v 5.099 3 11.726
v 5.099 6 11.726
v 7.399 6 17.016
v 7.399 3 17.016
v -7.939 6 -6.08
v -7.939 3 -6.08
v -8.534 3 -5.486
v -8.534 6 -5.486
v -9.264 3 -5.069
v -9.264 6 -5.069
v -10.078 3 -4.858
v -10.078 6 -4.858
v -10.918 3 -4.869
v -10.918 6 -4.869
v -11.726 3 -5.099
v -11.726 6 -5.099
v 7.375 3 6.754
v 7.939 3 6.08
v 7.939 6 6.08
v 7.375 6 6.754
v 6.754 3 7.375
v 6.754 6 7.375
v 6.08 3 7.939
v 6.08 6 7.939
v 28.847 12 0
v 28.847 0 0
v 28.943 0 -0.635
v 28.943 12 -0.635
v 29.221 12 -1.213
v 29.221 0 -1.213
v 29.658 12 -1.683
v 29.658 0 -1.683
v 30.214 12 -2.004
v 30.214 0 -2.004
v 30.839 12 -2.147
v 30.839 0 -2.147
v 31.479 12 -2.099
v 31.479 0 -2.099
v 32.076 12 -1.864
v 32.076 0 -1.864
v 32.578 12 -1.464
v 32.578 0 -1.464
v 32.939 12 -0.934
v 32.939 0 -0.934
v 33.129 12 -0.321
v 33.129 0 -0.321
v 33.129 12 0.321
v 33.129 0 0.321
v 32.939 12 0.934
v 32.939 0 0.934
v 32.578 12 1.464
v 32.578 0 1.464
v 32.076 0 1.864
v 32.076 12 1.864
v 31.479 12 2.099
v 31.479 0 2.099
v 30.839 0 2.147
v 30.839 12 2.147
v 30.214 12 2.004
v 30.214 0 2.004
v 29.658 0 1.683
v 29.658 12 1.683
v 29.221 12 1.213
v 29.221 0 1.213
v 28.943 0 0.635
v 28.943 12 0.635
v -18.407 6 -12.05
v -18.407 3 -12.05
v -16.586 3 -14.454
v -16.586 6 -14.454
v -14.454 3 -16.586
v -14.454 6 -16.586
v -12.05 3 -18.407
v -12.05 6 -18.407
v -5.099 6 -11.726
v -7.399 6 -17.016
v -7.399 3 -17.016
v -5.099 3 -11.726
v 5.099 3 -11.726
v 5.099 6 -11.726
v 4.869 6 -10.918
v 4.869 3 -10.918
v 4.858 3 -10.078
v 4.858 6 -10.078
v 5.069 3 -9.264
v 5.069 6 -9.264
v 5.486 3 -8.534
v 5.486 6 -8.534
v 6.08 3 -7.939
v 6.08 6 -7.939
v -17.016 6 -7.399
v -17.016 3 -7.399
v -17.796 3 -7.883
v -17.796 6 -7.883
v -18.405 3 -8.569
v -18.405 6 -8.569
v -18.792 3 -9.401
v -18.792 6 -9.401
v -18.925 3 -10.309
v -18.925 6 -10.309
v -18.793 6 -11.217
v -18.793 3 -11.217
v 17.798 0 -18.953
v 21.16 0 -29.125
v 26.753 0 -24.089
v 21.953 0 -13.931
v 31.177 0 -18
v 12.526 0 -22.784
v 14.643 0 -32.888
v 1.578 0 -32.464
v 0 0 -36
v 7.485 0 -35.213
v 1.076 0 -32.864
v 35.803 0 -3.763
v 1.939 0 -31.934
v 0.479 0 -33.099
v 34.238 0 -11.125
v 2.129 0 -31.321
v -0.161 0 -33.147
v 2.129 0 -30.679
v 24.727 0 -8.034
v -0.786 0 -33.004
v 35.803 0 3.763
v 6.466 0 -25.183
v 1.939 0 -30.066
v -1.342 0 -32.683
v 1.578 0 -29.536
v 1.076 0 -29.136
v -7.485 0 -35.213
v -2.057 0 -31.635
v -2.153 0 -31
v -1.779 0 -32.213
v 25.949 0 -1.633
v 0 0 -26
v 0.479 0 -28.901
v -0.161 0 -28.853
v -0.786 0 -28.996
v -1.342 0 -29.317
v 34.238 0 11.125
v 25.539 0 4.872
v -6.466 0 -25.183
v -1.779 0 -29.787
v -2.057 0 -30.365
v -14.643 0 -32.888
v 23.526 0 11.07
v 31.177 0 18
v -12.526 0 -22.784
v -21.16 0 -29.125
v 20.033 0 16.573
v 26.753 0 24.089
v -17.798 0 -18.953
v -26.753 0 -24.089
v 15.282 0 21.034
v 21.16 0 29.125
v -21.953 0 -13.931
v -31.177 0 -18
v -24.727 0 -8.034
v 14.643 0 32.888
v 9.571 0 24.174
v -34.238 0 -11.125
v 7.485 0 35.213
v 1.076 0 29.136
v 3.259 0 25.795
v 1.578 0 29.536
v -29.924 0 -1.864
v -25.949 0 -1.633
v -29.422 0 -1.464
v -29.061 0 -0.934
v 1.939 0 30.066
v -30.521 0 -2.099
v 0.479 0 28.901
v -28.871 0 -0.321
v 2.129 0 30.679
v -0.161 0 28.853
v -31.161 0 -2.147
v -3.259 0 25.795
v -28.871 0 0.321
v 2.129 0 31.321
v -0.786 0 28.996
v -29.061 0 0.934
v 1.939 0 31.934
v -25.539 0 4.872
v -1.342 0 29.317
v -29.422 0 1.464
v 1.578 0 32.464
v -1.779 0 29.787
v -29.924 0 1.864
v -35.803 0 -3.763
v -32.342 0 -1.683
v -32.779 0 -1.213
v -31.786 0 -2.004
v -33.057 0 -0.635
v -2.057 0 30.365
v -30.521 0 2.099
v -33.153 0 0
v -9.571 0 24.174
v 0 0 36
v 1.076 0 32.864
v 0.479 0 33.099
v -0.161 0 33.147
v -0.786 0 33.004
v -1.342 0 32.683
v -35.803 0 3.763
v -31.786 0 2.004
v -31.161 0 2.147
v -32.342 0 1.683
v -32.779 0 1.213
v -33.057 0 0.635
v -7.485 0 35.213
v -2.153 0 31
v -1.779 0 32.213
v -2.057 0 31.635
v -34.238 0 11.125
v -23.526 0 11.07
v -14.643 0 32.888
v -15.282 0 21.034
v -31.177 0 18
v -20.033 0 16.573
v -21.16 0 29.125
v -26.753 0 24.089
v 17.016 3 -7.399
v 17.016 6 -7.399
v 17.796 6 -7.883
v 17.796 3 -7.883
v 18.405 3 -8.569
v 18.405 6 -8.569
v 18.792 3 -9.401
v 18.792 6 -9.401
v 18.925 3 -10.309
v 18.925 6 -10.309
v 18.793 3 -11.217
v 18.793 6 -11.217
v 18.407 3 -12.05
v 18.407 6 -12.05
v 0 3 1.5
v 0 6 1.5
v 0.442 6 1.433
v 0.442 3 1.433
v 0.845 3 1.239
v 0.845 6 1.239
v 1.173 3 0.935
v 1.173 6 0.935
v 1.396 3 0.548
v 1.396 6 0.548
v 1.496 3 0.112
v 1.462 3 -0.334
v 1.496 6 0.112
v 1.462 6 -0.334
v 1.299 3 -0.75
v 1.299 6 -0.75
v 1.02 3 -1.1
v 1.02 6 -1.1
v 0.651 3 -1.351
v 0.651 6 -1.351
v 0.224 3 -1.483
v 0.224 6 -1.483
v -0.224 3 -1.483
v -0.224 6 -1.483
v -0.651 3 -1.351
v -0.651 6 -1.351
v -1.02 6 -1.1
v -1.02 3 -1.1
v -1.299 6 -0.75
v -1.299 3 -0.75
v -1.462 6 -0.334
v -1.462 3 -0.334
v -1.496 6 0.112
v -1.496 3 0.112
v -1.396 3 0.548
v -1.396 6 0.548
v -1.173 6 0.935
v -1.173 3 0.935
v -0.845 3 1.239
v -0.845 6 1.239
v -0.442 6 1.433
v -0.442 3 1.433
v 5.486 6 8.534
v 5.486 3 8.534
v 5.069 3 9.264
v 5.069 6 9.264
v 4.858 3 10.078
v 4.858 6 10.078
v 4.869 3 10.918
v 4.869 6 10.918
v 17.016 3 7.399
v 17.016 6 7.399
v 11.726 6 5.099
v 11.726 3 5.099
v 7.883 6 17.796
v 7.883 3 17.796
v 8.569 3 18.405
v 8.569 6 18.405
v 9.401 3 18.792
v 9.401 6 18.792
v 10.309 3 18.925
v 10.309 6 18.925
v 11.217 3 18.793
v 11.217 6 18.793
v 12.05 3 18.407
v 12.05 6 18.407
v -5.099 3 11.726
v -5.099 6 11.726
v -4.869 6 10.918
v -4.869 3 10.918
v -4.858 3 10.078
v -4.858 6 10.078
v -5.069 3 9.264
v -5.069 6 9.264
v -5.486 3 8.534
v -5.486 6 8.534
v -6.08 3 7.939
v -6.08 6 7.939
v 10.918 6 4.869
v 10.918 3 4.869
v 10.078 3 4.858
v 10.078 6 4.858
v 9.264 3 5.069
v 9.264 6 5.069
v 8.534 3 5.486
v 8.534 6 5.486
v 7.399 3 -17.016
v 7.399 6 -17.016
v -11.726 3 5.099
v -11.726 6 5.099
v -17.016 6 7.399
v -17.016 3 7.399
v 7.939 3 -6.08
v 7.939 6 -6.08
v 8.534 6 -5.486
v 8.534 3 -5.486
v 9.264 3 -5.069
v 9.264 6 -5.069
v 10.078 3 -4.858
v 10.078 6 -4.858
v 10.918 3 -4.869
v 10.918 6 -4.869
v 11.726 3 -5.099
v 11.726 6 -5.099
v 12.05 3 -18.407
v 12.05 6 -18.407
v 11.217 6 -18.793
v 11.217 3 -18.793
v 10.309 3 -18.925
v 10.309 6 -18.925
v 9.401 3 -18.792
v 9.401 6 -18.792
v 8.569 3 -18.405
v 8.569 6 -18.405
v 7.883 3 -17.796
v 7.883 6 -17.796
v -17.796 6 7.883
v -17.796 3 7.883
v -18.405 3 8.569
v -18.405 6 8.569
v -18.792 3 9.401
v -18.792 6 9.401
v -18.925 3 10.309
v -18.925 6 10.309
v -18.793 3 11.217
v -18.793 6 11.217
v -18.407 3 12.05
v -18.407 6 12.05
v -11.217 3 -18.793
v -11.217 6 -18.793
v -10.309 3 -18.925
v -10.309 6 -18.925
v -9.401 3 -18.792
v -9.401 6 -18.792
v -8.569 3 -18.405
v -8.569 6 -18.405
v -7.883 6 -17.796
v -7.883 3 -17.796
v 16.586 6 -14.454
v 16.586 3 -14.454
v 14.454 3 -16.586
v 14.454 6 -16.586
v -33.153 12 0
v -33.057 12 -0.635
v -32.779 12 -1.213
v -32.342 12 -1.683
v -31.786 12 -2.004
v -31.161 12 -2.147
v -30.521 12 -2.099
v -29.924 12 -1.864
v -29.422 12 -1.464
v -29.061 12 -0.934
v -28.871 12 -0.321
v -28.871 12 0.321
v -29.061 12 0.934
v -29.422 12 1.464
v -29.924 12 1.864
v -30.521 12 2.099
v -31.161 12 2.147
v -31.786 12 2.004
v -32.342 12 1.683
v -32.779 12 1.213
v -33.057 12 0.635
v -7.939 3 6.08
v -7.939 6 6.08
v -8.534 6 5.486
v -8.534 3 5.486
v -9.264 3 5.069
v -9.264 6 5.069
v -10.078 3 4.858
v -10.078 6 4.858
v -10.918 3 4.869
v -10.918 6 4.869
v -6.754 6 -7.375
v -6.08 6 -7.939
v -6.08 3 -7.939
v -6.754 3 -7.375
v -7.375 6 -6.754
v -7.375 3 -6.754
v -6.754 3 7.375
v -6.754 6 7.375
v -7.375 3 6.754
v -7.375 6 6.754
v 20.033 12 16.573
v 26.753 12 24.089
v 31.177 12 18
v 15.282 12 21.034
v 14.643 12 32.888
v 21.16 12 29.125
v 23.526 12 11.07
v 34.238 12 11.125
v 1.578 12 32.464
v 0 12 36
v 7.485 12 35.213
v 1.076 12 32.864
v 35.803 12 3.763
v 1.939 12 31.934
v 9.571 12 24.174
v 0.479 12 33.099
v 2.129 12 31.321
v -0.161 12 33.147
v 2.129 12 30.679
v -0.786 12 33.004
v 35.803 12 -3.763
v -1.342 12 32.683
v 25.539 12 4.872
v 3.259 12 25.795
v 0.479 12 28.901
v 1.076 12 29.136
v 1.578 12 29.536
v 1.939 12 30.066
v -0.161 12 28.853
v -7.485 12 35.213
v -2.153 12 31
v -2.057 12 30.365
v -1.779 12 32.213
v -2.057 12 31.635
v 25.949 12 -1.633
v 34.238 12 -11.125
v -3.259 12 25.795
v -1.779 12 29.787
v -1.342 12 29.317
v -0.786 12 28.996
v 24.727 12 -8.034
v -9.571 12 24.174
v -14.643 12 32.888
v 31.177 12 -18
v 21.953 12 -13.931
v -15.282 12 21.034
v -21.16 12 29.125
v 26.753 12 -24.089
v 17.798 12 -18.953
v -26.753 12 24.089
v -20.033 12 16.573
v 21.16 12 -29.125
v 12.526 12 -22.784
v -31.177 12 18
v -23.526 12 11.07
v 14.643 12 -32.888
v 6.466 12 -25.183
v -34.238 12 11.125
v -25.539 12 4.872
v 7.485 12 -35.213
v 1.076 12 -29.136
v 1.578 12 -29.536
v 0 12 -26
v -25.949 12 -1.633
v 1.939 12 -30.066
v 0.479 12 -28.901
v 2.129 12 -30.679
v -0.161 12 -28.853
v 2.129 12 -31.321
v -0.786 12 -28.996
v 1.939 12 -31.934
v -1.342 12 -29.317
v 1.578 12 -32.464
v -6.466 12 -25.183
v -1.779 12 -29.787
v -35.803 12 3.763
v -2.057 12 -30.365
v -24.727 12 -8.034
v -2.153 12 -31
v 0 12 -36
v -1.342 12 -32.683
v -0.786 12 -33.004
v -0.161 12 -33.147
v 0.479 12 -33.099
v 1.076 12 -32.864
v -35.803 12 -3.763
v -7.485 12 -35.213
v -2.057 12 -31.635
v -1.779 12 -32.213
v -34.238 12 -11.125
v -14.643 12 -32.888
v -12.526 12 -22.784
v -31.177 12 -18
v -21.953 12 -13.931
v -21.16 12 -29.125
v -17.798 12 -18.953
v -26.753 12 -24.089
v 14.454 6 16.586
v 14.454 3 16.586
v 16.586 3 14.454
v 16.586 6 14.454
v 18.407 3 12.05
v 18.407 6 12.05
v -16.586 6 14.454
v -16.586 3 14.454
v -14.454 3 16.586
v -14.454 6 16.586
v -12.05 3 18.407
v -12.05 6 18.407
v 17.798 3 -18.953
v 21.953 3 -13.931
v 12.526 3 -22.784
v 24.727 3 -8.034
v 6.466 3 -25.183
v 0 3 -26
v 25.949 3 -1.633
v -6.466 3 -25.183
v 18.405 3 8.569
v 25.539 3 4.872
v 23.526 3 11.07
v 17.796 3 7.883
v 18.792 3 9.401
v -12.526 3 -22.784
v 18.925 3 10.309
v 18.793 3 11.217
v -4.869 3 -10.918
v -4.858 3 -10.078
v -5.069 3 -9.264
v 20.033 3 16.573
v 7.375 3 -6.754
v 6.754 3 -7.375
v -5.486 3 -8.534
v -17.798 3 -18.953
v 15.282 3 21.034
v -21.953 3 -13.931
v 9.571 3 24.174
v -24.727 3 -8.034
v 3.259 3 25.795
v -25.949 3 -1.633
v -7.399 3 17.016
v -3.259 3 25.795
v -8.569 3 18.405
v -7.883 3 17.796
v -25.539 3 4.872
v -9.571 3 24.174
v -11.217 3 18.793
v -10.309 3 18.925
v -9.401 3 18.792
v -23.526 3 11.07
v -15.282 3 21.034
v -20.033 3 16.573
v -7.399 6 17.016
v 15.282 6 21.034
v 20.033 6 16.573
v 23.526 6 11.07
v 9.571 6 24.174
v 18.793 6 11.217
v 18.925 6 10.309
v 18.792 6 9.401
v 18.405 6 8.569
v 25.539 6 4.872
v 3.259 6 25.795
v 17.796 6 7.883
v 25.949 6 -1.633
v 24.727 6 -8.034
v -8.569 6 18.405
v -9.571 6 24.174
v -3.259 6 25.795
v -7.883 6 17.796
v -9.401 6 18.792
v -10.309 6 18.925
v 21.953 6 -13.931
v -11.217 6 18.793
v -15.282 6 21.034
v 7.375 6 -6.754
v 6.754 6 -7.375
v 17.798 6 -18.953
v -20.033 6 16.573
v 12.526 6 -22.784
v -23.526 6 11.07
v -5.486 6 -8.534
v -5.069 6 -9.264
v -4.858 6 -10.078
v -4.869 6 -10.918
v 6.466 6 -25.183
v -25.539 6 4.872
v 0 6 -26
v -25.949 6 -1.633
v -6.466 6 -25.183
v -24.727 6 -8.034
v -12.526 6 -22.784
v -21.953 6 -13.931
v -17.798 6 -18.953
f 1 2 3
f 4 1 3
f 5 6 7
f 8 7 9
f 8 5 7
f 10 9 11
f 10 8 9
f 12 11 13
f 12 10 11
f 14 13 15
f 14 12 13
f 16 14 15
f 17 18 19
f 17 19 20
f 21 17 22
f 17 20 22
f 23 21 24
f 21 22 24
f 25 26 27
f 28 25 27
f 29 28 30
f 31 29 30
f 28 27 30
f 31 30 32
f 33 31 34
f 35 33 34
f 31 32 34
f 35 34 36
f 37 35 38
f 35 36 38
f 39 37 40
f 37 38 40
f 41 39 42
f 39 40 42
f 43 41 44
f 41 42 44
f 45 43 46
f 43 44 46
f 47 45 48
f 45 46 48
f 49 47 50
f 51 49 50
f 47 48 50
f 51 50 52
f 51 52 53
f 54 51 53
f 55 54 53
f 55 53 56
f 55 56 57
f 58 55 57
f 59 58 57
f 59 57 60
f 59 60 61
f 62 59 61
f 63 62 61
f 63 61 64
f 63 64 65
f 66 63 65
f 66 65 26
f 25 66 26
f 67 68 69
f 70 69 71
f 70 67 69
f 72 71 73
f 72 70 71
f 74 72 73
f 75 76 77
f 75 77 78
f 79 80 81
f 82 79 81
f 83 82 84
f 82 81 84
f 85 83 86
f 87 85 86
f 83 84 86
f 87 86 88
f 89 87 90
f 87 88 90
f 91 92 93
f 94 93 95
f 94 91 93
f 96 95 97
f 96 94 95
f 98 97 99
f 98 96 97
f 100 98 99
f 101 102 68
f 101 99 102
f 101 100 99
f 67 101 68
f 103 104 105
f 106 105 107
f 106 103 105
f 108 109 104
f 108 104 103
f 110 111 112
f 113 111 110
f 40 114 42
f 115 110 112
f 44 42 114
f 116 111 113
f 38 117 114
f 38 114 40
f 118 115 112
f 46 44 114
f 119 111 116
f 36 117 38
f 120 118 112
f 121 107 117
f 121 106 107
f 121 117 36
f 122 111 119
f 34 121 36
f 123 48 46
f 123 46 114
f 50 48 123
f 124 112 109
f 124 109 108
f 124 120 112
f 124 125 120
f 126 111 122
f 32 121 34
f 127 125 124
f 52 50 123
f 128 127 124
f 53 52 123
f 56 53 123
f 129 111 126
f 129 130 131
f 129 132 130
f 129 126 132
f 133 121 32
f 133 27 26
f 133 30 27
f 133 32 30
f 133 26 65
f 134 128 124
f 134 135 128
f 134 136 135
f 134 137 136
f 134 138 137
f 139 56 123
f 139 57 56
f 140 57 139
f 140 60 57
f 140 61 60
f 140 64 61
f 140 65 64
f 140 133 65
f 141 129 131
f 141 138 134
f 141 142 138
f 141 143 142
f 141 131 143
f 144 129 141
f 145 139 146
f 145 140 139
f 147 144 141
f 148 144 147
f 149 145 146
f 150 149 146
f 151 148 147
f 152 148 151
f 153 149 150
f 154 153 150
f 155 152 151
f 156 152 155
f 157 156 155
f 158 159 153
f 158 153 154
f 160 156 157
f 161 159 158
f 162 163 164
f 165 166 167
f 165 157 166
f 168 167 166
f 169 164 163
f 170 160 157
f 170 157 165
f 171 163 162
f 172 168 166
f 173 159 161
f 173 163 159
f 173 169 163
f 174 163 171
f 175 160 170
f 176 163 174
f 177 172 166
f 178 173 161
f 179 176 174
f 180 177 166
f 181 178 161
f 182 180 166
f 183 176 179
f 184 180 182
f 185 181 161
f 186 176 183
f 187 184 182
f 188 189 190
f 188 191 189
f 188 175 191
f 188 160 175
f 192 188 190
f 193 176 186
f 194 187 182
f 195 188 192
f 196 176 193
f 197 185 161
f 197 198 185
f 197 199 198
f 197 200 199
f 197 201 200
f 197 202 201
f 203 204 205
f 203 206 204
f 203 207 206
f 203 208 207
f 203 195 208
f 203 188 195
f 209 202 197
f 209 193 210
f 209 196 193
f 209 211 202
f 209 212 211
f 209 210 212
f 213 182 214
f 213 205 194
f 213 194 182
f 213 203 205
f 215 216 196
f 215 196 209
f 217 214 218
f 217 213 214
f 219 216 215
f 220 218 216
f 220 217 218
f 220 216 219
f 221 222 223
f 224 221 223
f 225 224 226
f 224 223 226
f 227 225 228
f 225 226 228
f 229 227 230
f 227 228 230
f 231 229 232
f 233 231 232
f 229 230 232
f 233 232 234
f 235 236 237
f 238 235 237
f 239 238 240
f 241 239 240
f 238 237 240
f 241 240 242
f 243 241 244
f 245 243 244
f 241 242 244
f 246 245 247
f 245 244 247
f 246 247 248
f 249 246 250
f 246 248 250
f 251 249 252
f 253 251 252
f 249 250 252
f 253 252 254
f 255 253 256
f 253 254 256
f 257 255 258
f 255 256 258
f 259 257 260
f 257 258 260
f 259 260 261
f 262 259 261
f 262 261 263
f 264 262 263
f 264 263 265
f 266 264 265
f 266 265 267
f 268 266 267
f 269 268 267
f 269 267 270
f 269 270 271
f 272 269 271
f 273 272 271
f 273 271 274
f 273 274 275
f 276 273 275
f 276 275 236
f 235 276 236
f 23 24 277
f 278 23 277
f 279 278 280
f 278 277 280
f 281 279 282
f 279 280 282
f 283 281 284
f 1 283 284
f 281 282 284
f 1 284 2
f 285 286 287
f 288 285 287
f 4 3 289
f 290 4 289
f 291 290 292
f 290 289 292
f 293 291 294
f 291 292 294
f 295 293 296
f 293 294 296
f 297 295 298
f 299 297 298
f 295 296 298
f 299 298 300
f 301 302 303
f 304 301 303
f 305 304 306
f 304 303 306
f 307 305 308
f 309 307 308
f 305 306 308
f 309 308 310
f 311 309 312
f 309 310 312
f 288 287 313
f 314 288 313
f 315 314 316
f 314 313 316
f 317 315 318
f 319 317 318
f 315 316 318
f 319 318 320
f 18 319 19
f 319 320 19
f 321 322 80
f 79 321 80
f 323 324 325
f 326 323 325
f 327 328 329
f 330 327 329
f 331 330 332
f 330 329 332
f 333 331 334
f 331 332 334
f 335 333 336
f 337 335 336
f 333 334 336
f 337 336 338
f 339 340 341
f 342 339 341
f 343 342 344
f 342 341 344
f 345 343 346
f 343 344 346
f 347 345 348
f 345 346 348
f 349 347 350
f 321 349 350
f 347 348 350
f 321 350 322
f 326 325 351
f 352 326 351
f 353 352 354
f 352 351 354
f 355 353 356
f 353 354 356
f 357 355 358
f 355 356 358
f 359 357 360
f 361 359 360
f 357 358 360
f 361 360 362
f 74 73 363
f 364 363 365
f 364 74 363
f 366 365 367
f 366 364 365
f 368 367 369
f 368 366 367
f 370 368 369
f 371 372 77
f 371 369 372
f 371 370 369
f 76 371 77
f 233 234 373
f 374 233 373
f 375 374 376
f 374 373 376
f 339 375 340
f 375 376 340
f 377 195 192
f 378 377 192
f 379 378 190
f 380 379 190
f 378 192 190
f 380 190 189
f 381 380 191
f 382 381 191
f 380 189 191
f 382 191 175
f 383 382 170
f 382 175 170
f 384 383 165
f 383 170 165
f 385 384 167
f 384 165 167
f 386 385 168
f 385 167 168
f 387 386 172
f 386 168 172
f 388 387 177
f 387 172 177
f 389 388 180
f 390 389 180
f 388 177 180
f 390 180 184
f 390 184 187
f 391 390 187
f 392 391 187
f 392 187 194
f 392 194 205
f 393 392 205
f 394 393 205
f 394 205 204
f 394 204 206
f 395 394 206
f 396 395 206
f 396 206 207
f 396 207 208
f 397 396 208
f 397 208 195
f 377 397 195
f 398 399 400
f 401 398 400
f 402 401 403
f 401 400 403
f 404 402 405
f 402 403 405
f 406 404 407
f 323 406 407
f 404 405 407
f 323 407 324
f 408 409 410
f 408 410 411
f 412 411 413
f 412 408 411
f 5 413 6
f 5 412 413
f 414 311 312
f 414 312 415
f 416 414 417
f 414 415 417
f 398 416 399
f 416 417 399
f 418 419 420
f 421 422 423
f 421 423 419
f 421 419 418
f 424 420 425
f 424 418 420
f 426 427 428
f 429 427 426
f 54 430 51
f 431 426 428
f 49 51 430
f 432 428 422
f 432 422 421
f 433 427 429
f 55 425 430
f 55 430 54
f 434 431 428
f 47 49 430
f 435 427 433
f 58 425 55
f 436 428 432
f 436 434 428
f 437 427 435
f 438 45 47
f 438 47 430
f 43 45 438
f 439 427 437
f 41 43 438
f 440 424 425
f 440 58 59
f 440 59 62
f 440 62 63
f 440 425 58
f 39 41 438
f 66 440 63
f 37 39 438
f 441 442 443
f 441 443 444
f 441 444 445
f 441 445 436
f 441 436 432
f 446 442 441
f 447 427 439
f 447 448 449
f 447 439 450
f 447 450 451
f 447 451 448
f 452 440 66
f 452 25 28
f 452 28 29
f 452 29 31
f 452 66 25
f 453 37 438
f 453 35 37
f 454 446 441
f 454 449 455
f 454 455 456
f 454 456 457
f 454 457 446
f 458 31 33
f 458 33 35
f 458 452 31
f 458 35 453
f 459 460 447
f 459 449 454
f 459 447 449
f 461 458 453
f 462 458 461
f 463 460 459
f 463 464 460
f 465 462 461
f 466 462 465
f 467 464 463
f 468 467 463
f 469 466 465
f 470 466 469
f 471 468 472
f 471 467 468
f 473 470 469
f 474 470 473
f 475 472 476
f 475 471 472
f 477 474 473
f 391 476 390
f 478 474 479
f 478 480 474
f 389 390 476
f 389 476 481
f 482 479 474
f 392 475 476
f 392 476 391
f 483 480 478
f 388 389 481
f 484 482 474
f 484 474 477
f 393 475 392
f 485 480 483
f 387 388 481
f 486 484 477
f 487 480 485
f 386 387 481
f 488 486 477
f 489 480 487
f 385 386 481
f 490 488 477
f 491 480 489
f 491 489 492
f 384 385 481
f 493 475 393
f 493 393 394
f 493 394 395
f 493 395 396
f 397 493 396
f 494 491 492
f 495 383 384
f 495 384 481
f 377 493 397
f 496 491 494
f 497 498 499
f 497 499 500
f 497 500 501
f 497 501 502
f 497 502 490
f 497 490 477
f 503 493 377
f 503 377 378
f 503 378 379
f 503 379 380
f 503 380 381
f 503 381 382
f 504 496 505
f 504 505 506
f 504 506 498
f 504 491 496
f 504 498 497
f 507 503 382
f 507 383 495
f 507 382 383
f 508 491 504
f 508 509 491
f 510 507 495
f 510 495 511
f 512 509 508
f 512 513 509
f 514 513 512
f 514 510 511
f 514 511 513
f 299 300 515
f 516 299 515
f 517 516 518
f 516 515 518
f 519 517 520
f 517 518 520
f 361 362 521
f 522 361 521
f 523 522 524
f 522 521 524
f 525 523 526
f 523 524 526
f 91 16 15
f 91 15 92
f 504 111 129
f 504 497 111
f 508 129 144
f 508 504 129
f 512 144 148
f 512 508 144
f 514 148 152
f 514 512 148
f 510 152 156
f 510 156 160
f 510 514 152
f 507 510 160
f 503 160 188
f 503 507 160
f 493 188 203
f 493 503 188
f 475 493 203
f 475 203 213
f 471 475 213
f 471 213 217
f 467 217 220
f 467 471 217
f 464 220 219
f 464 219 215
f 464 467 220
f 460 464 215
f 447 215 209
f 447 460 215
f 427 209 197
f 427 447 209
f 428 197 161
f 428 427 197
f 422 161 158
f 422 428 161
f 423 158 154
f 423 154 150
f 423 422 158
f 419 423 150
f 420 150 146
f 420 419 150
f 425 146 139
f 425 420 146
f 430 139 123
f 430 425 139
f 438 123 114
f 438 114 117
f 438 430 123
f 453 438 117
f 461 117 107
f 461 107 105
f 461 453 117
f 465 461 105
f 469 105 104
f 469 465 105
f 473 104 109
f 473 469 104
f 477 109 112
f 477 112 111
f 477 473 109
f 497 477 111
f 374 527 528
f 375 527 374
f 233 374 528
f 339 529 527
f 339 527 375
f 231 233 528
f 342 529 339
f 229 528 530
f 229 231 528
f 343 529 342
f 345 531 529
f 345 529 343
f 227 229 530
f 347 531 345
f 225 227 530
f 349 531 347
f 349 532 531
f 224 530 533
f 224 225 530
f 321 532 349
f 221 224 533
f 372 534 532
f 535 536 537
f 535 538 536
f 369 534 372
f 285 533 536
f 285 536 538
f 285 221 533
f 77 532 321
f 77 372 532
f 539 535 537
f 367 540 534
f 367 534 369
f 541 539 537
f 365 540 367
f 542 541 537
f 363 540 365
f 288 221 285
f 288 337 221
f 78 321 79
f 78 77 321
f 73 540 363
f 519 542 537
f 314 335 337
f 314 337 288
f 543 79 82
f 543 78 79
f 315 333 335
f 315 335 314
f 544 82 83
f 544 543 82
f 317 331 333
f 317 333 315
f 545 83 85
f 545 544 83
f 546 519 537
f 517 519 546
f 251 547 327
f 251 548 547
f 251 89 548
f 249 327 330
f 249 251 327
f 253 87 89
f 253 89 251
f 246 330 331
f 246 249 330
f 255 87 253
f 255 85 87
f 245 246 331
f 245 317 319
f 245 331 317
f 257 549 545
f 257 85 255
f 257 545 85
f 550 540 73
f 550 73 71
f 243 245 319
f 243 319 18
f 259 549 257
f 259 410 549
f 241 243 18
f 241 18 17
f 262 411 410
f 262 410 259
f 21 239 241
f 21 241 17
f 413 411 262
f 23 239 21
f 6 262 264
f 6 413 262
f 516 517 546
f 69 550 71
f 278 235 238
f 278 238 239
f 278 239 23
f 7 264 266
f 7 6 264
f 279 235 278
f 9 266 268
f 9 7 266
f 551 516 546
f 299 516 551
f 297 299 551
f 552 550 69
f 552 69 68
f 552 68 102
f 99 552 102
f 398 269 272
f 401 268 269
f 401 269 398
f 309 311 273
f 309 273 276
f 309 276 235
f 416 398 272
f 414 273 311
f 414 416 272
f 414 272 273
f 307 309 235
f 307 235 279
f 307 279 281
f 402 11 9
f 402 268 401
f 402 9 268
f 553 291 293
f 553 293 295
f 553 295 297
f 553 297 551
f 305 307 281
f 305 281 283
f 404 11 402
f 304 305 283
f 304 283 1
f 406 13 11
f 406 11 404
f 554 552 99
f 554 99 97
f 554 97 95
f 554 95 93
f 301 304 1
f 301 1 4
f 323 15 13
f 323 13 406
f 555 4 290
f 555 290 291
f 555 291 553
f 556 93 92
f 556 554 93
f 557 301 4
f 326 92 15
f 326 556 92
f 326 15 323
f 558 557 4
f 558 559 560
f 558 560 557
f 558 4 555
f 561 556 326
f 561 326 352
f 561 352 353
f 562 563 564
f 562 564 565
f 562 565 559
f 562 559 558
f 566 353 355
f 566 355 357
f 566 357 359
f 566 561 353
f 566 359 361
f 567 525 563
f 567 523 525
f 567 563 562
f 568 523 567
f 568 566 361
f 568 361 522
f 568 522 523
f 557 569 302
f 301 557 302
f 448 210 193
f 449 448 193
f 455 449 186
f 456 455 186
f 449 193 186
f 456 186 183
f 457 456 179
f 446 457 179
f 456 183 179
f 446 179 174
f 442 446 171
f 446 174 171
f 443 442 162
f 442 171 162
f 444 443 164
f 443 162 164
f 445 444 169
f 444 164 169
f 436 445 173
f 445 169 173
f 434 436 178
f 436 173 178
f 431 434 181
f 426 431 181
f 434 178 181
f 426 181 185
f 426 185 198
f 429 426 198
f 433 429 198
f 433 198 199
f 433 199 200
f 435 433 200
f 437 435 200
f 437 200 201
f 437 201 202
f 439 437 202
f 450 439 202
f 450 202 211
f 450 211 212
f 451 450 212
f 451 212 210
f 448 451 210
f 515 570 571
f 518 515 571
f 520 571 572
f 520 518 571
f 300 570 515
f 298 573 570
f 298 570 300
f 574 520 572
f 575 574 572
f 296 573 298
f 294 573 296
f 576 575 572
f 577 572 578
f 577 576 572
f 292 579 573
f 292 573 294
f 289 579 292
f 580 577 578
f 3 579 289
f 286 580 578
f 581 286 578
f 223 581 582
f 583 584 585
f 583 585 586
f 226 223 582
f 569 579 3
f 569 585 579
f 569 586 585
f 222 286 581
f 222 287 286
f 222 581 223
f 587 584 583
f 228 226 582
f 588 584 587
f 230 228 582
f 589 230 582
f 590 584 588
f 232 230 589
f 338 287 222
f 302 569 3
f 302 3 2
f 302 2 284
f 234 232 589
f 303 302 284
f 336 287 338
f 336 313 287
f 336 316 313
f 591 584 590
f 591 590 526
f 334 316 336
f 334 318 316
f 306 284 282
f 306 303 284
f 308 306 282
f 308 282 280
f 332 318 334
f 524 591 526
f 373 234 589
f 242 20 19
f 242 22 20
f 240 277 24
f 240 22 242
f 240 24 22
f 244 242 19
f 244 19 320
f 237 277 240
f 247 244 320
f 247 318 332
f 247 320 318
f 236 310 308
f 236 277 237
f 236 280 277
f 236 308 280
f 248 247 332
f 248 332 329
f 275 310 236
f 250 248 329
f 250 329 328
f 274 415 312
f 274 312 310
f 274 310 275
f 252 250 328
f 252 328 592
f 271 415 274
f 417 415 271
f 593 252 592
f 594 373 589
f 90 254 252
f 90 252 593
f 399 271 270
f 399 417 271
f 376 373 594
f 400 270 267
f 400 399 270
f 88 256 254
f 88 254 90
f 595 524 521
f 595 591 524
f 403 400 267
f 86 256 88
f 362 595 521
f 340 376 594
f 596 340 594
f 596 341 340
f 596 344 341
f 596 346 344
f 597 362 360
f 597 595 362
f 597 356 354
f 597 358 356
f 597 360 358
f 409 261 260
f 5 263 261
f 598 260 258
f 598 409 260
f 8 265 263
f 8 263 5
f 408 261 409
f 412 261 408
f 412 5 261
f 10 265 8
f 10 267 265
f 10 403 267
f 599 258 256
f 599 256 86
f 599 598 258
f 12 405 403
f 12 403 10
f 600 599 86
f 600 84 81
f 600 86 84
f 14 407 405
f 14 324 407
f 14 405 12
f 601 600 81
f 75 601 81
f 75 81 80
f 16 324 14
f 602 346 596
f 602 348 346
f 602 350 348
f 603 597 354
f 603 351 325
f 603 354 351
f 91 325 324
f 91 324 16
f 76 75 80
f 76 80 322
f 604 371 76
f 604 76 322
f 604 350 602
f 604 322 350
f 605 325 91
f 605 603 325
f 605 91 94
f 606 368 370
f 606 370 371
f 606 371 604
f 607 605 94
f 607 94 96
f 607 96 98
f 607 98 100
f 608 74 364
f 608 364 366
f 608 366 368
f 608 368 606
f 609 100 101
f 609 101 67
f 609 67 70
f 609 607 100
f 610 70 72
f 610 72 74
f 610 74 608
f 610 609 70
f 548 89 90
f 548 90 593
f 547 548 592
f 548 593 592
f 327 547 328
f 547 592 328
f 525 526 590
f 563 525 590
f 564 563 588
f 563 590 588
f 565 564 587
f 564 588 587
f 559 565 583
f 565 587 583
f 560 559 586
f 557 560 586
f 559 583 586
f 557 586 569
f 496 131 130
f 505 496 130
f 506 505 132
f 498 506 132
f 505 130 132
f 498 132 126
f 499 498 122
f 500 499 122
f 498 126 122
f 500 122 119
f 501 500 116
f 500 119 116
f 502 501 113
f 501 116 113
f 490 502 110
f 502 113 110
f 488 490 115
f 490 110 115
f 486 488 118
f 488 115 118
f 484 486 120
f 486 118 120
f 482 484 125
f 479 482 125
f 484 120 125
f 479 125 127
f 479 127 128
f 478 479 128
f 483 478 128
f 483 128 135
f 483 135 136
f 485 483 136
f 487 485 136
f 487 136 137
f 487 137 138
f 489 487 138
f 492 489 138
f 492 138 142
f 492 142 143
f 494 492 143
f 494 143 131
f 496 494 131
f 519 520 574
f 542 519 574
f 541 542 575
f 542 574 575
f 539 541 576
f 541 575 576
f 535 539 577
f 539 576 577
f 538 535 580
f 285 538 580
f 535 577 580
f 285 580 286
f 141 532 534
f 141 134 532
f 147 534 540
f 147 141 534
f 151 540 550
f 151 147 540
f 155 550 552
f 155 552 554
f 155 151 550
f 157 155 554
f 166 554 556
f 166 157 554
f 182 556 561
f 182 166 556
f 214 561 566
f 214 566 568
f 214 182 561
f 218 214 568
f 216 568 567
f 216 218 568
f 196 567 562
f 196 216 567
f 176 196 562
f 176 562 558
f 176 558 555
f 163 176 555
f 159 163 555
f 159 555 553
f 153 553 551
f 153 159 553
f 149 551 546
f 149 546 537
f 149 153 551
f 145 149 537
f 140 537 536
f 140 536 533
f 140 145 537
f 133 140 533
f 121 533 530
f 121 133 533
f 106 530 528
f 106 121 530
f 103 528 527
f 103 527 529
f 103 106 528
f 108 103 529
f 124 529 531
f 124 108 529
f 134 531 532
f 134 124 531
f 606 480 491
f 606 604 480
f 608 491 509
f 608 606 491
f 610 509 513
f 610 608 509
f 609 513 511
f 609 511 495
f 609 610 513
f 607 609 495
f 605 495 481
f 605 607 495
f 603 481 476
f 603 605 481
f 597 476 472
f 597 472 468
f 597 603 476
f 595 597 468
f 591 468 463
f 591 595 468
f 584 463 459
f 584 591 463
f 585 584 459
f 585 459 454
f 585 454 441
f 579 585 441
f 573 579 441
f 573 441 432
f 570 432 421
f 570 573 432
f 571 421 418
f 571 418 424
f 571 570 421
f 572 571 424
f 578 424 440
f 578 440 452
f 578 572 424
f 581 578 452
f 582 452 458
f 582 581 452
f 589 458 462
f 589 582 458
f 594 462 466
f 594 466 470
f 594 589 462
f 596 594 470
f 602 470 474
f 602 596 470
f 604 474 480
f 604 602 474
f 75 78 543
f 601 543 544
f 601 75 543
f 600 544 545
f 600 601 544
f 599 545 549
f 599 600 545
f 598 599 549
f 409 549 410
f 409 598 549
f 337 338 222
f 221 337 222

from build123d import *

# Parameters (mm, degrees)
CUT_EXTRUDE1_REACH               = 53.264
F_18_0_1695_DIAMETER_HOLE1_D     = 4.3053
F_18_0_1695_DIAMETER_HOLE1_DEPTH = 381
F_18_0_1695_DIAMETER_HOLE1_TIP   = 1.293442612
CUT_EXTRUDE2_REACH               = 53.264
SKETCH5_R                        = 1.5


with BuildPart() as part:
    # Sketch1 → Revolve1 (revolve)
    with BuildSketch(Plane.XY):
        Polygon((0, 3), (26, 3), (26, 0), (36, 0), (36, 12), (26, 12), (26, 6), (0, 6), align=None)
    revolve(axis=Axis((0, 0, 0), (0, 1, 0)))

    # Sketch2 → Cut-Extrude1 (cut, up to next)
    with BuildSketch(Plane(origin=(0, 6, 0), x_dir=(1, 0, 0), z_dir=(0, 1, 0)), mode=Mode.PRIVATE) as cut_extrude1_sk1:
        with BuildLine():
            Line((7.398917645, 17.016345603), (5.098689446, 11.726182923))
            ThreePointArc((5.098689446, 11.726182923), (4.936869827, 9.663717077), (6.079965983, 7.939396303))
            ThreePointArc((6.079965983, 7.939396303), (7.071067812, 7.071067812), (7.939396303, 6.079965983))
            ThreePointArc((7.939396303, 6.079965983), (9.663717077, 4.936869827), (11.726182923, 5.098689446))
            Line((11.726182923, 5.098689446), (17.016345603, 7.398917645))
            ThreePointArc((17.016345603, 7.398917645), (18.792276888, 9.401129193), (18.406745328, 12.049552955))
            ThreePointArc((18.406745328, 12.049552955), (15.556349186, 15.556349186), (12.049552955, 18.406745328))
            ThreePointArc((12.049552955, 18.406745328), (9.401129193, 18.792276888), (7.398917645, 17.016345603))
        make_face()
    cut_extrude1_tool1 = extrude(cut_extrude1_sk1.sketch, amount=-CUT_EXTRUDE1_REACH, mode=Mode.PRIVATE) & part.part
    # Sketch2 → Cut-Extrude1 (cut, up to next)
    with BuildSketch(Plane(origin=(0, 6, 0), x_dir=(1, 0, 0), z_dir=(0, 1, 0)), mode=Mode.PRIVATE) as cut_extrude1_sk2:
        with BuildLine():
            Line((-7.398917645, 17.016345603), (-5.098689446, 11.726182923))
            ThreePointArc((-5.098689446, 11.726182923), (-4.936869827, 9.663717077), (-6.079965983, 7.939396303))
            ThreePointArc((-6.079965983, 7.939396303), (-7.071067812, 7.071067812), (-7.939396303, 6.079965983))
            ThreePointArc((-7.939396303, 6.079965983), (-9.663717077, 4.936869827), (-11.726182923, 5.098689446))
            Line((-11.726182923, 5.098689446), (-17.016345603, 7.398917645))
            ThreePointArc((-17.016345603, 7.398917645), (-18.792276888, 9.401129193), (-18.406745328, 12.049552955))
            ThreePointArc((-18.406745328, 12.049552955), (-15.556349186, 15.556349186), (-12.049552955, 18.406745328))
            ThreePointArc((-12.049552955, 18.406745328), (-9.401129193, 18.792276888), (-7.398917645, 17.016345603))
        make_face()
    cut_extrude1_tool2 = extrude(cut_extrude1_sk2.sketch, amount=-CUT_EXTRUDE1_REACH, mode=Mode.PRIVATE) & part.part
    # Sketch2 → Cut-Extrude1 (cut, up to next)
    with BuildSketch(Plane(origin=(0, 6, 0), x_dir=(1, 0, 0), z_dir=(0, 1, 0)), mode=Mode.PRIVATE) as cut_extrude1_sk3:
        with BuildLine():
            Line((17.016345603, -7.398917645), (11.726182923, -5.098689446))
            ThreePointArc((11.726182923, -5.098689446), (9.663717077, -4.936869827), (7.939396303, -6.079965983))
            ThreePointArc((7.939396303, -6.079965983), (7.071067812, -7.071067812), (6.079965983, -7.939396303))
            ThreePointArc((6.079965983, -7.939396303), (4.936869827, -9.663717077), (5.098689446, -11.726182923))
            Line((5.098689446, -11.726182923), (7.398917645, -17.016345603))
            ThreePointArc((7.398917645, -17.016345603), (9.401129193, -18.792276888), (12.049552955, -18.406745328))
            ThreePointArc((12.049552955, -18.406745328), (15.556349186, -15.556349186), (18.406745328, -12.049552955))
            ThreePointArc((18.406745328, -12.049552955), (18.792276888, -9.401129193), (17.016345603, -7.398917645))
        make_face()
    cut_extrude1_tool3 = extrude(cut_extrude1_sk3.sketch, amount=-CUT_EXTRUDE1_REACH, mode=Mode.PRIVATE) & part.part
    # Sketch2 → Cut-Extrude1 (cut, up to next)
    with BuildSketch(Plane(origin=(0, 6, 0), x_dir=(1, 0, 0), z_dir=(0, 1, 0)), mode=Mode.PRIVATE) as cut_extrude1_sk4:
        with BuildLine():
            Line((-7.398917645, -17.016345603), (-5.098689446, -11.726182923))
            ThreePointArc((-5.098689446, -11.726182923), (-4.936869827, -9.663717077), (-6.079965983, -7.939396303))
            ThreePointArc((-6.079965983, -7.939396303), (-7.071067812, -7.071067812), (-7.939396303, -6.079965983))
            ThreePointArc((-7.939396303, -6.079965983), (-9.663717077, -4.936869827), (-11.726182923, -5.098689446))
            Line((-11.726182923, -5.098689446), (-17.016345603, -7.398917645))
            ThreePointArc((-17.016345603, -7.398917645), (-18.792276888, -9.401129193), (-18.406745328, -12.049552955))
            ThreePointArc((-18.406745328, -12.049552955), (-15.556349186, -15.556349186), (-12.049552955, -18.406745328))
            ThreePointArc((-12.049552955, -18.406745328), (-9.401129193, -18.792276888), (-7.398917645, -17.016345603))
        make_face()
    cut_extrude1_tool4 = extrude(cut_extrude1_sk4.sketch, amount=-CUT_EXTRUDE1_REACH, mode=Mode.PRIVATE) & part.part
    add(cut_extrude1_tool1.solids().sort_by_distance((11.555905, 6, -11.555905))[0], mode=Mode.SUBTRACT)
    add(cut_extrude1_tool2.solids().sort_by_distance((-11.555905, 6, -11.555905))[0], mode=Mode.SUBTRACT)
    add(cut_extrude1_tool3.solids().sort_by_distance((11.555905, 6, 11.555905))[0], mode=Mode.SUBTRACT)
    add(cut_extrude1_tool4.solids().sort_by_distance((-11.555905, 6, 11.555905))[0], mode=Mode.SUBTRACT)

    # #18 (0.1695) Diameter Hole1
    with Locations(Plane(origin=(0, 12, 0), x_dir=(1, 0, 0), z_dir=(0, 1, 0))):
        with Locations((0, 31), (0, -31), (-31, 0), (31, 0)):
            Hole(F_18_0_1695_DIAMETER_HOLE1_D / 2, depth=F_18_0_1695_DIAMETER_HOLE1_DEPTH)
            with Locations((0, 0, -(F_18_0_1695_DIAMETER_HOLE1_DEPTH + F_18_0_1695_DIAMETER_HOLE1_TIP / 2))):  # 118° drill point
                Cone(0, F_18_0_1695_DIAMETER_HOLE1_D / 2, F_18_0_1695_DIAMETER_HOLE1_TIP, mode=Mode.SUBTRACT)

    # Sketch5 → Cut-Extrude2 (cut, up to next)
    with BuildSketch(Plane(origin=(0, 6, 0), x_dir=(1, 0, 0), z_dir=(0, 1, 0)), mode=Mode.PRIVATE) as cut_extrude2_sk1:
        Circle(SKETCH5_R)
    cut_extrude2_tool1 = extrude(cut_extrude2_sk1.sketch, amount=-CUT_EXTRUDE2_REACH, mode=Mode.PRIVATE) & part.part
    add(cut_extrude2_tool1.solids().sort_by_distance((0, 6, 0))[0], mode=Mode.SUBTRACT)


solid = part.part
